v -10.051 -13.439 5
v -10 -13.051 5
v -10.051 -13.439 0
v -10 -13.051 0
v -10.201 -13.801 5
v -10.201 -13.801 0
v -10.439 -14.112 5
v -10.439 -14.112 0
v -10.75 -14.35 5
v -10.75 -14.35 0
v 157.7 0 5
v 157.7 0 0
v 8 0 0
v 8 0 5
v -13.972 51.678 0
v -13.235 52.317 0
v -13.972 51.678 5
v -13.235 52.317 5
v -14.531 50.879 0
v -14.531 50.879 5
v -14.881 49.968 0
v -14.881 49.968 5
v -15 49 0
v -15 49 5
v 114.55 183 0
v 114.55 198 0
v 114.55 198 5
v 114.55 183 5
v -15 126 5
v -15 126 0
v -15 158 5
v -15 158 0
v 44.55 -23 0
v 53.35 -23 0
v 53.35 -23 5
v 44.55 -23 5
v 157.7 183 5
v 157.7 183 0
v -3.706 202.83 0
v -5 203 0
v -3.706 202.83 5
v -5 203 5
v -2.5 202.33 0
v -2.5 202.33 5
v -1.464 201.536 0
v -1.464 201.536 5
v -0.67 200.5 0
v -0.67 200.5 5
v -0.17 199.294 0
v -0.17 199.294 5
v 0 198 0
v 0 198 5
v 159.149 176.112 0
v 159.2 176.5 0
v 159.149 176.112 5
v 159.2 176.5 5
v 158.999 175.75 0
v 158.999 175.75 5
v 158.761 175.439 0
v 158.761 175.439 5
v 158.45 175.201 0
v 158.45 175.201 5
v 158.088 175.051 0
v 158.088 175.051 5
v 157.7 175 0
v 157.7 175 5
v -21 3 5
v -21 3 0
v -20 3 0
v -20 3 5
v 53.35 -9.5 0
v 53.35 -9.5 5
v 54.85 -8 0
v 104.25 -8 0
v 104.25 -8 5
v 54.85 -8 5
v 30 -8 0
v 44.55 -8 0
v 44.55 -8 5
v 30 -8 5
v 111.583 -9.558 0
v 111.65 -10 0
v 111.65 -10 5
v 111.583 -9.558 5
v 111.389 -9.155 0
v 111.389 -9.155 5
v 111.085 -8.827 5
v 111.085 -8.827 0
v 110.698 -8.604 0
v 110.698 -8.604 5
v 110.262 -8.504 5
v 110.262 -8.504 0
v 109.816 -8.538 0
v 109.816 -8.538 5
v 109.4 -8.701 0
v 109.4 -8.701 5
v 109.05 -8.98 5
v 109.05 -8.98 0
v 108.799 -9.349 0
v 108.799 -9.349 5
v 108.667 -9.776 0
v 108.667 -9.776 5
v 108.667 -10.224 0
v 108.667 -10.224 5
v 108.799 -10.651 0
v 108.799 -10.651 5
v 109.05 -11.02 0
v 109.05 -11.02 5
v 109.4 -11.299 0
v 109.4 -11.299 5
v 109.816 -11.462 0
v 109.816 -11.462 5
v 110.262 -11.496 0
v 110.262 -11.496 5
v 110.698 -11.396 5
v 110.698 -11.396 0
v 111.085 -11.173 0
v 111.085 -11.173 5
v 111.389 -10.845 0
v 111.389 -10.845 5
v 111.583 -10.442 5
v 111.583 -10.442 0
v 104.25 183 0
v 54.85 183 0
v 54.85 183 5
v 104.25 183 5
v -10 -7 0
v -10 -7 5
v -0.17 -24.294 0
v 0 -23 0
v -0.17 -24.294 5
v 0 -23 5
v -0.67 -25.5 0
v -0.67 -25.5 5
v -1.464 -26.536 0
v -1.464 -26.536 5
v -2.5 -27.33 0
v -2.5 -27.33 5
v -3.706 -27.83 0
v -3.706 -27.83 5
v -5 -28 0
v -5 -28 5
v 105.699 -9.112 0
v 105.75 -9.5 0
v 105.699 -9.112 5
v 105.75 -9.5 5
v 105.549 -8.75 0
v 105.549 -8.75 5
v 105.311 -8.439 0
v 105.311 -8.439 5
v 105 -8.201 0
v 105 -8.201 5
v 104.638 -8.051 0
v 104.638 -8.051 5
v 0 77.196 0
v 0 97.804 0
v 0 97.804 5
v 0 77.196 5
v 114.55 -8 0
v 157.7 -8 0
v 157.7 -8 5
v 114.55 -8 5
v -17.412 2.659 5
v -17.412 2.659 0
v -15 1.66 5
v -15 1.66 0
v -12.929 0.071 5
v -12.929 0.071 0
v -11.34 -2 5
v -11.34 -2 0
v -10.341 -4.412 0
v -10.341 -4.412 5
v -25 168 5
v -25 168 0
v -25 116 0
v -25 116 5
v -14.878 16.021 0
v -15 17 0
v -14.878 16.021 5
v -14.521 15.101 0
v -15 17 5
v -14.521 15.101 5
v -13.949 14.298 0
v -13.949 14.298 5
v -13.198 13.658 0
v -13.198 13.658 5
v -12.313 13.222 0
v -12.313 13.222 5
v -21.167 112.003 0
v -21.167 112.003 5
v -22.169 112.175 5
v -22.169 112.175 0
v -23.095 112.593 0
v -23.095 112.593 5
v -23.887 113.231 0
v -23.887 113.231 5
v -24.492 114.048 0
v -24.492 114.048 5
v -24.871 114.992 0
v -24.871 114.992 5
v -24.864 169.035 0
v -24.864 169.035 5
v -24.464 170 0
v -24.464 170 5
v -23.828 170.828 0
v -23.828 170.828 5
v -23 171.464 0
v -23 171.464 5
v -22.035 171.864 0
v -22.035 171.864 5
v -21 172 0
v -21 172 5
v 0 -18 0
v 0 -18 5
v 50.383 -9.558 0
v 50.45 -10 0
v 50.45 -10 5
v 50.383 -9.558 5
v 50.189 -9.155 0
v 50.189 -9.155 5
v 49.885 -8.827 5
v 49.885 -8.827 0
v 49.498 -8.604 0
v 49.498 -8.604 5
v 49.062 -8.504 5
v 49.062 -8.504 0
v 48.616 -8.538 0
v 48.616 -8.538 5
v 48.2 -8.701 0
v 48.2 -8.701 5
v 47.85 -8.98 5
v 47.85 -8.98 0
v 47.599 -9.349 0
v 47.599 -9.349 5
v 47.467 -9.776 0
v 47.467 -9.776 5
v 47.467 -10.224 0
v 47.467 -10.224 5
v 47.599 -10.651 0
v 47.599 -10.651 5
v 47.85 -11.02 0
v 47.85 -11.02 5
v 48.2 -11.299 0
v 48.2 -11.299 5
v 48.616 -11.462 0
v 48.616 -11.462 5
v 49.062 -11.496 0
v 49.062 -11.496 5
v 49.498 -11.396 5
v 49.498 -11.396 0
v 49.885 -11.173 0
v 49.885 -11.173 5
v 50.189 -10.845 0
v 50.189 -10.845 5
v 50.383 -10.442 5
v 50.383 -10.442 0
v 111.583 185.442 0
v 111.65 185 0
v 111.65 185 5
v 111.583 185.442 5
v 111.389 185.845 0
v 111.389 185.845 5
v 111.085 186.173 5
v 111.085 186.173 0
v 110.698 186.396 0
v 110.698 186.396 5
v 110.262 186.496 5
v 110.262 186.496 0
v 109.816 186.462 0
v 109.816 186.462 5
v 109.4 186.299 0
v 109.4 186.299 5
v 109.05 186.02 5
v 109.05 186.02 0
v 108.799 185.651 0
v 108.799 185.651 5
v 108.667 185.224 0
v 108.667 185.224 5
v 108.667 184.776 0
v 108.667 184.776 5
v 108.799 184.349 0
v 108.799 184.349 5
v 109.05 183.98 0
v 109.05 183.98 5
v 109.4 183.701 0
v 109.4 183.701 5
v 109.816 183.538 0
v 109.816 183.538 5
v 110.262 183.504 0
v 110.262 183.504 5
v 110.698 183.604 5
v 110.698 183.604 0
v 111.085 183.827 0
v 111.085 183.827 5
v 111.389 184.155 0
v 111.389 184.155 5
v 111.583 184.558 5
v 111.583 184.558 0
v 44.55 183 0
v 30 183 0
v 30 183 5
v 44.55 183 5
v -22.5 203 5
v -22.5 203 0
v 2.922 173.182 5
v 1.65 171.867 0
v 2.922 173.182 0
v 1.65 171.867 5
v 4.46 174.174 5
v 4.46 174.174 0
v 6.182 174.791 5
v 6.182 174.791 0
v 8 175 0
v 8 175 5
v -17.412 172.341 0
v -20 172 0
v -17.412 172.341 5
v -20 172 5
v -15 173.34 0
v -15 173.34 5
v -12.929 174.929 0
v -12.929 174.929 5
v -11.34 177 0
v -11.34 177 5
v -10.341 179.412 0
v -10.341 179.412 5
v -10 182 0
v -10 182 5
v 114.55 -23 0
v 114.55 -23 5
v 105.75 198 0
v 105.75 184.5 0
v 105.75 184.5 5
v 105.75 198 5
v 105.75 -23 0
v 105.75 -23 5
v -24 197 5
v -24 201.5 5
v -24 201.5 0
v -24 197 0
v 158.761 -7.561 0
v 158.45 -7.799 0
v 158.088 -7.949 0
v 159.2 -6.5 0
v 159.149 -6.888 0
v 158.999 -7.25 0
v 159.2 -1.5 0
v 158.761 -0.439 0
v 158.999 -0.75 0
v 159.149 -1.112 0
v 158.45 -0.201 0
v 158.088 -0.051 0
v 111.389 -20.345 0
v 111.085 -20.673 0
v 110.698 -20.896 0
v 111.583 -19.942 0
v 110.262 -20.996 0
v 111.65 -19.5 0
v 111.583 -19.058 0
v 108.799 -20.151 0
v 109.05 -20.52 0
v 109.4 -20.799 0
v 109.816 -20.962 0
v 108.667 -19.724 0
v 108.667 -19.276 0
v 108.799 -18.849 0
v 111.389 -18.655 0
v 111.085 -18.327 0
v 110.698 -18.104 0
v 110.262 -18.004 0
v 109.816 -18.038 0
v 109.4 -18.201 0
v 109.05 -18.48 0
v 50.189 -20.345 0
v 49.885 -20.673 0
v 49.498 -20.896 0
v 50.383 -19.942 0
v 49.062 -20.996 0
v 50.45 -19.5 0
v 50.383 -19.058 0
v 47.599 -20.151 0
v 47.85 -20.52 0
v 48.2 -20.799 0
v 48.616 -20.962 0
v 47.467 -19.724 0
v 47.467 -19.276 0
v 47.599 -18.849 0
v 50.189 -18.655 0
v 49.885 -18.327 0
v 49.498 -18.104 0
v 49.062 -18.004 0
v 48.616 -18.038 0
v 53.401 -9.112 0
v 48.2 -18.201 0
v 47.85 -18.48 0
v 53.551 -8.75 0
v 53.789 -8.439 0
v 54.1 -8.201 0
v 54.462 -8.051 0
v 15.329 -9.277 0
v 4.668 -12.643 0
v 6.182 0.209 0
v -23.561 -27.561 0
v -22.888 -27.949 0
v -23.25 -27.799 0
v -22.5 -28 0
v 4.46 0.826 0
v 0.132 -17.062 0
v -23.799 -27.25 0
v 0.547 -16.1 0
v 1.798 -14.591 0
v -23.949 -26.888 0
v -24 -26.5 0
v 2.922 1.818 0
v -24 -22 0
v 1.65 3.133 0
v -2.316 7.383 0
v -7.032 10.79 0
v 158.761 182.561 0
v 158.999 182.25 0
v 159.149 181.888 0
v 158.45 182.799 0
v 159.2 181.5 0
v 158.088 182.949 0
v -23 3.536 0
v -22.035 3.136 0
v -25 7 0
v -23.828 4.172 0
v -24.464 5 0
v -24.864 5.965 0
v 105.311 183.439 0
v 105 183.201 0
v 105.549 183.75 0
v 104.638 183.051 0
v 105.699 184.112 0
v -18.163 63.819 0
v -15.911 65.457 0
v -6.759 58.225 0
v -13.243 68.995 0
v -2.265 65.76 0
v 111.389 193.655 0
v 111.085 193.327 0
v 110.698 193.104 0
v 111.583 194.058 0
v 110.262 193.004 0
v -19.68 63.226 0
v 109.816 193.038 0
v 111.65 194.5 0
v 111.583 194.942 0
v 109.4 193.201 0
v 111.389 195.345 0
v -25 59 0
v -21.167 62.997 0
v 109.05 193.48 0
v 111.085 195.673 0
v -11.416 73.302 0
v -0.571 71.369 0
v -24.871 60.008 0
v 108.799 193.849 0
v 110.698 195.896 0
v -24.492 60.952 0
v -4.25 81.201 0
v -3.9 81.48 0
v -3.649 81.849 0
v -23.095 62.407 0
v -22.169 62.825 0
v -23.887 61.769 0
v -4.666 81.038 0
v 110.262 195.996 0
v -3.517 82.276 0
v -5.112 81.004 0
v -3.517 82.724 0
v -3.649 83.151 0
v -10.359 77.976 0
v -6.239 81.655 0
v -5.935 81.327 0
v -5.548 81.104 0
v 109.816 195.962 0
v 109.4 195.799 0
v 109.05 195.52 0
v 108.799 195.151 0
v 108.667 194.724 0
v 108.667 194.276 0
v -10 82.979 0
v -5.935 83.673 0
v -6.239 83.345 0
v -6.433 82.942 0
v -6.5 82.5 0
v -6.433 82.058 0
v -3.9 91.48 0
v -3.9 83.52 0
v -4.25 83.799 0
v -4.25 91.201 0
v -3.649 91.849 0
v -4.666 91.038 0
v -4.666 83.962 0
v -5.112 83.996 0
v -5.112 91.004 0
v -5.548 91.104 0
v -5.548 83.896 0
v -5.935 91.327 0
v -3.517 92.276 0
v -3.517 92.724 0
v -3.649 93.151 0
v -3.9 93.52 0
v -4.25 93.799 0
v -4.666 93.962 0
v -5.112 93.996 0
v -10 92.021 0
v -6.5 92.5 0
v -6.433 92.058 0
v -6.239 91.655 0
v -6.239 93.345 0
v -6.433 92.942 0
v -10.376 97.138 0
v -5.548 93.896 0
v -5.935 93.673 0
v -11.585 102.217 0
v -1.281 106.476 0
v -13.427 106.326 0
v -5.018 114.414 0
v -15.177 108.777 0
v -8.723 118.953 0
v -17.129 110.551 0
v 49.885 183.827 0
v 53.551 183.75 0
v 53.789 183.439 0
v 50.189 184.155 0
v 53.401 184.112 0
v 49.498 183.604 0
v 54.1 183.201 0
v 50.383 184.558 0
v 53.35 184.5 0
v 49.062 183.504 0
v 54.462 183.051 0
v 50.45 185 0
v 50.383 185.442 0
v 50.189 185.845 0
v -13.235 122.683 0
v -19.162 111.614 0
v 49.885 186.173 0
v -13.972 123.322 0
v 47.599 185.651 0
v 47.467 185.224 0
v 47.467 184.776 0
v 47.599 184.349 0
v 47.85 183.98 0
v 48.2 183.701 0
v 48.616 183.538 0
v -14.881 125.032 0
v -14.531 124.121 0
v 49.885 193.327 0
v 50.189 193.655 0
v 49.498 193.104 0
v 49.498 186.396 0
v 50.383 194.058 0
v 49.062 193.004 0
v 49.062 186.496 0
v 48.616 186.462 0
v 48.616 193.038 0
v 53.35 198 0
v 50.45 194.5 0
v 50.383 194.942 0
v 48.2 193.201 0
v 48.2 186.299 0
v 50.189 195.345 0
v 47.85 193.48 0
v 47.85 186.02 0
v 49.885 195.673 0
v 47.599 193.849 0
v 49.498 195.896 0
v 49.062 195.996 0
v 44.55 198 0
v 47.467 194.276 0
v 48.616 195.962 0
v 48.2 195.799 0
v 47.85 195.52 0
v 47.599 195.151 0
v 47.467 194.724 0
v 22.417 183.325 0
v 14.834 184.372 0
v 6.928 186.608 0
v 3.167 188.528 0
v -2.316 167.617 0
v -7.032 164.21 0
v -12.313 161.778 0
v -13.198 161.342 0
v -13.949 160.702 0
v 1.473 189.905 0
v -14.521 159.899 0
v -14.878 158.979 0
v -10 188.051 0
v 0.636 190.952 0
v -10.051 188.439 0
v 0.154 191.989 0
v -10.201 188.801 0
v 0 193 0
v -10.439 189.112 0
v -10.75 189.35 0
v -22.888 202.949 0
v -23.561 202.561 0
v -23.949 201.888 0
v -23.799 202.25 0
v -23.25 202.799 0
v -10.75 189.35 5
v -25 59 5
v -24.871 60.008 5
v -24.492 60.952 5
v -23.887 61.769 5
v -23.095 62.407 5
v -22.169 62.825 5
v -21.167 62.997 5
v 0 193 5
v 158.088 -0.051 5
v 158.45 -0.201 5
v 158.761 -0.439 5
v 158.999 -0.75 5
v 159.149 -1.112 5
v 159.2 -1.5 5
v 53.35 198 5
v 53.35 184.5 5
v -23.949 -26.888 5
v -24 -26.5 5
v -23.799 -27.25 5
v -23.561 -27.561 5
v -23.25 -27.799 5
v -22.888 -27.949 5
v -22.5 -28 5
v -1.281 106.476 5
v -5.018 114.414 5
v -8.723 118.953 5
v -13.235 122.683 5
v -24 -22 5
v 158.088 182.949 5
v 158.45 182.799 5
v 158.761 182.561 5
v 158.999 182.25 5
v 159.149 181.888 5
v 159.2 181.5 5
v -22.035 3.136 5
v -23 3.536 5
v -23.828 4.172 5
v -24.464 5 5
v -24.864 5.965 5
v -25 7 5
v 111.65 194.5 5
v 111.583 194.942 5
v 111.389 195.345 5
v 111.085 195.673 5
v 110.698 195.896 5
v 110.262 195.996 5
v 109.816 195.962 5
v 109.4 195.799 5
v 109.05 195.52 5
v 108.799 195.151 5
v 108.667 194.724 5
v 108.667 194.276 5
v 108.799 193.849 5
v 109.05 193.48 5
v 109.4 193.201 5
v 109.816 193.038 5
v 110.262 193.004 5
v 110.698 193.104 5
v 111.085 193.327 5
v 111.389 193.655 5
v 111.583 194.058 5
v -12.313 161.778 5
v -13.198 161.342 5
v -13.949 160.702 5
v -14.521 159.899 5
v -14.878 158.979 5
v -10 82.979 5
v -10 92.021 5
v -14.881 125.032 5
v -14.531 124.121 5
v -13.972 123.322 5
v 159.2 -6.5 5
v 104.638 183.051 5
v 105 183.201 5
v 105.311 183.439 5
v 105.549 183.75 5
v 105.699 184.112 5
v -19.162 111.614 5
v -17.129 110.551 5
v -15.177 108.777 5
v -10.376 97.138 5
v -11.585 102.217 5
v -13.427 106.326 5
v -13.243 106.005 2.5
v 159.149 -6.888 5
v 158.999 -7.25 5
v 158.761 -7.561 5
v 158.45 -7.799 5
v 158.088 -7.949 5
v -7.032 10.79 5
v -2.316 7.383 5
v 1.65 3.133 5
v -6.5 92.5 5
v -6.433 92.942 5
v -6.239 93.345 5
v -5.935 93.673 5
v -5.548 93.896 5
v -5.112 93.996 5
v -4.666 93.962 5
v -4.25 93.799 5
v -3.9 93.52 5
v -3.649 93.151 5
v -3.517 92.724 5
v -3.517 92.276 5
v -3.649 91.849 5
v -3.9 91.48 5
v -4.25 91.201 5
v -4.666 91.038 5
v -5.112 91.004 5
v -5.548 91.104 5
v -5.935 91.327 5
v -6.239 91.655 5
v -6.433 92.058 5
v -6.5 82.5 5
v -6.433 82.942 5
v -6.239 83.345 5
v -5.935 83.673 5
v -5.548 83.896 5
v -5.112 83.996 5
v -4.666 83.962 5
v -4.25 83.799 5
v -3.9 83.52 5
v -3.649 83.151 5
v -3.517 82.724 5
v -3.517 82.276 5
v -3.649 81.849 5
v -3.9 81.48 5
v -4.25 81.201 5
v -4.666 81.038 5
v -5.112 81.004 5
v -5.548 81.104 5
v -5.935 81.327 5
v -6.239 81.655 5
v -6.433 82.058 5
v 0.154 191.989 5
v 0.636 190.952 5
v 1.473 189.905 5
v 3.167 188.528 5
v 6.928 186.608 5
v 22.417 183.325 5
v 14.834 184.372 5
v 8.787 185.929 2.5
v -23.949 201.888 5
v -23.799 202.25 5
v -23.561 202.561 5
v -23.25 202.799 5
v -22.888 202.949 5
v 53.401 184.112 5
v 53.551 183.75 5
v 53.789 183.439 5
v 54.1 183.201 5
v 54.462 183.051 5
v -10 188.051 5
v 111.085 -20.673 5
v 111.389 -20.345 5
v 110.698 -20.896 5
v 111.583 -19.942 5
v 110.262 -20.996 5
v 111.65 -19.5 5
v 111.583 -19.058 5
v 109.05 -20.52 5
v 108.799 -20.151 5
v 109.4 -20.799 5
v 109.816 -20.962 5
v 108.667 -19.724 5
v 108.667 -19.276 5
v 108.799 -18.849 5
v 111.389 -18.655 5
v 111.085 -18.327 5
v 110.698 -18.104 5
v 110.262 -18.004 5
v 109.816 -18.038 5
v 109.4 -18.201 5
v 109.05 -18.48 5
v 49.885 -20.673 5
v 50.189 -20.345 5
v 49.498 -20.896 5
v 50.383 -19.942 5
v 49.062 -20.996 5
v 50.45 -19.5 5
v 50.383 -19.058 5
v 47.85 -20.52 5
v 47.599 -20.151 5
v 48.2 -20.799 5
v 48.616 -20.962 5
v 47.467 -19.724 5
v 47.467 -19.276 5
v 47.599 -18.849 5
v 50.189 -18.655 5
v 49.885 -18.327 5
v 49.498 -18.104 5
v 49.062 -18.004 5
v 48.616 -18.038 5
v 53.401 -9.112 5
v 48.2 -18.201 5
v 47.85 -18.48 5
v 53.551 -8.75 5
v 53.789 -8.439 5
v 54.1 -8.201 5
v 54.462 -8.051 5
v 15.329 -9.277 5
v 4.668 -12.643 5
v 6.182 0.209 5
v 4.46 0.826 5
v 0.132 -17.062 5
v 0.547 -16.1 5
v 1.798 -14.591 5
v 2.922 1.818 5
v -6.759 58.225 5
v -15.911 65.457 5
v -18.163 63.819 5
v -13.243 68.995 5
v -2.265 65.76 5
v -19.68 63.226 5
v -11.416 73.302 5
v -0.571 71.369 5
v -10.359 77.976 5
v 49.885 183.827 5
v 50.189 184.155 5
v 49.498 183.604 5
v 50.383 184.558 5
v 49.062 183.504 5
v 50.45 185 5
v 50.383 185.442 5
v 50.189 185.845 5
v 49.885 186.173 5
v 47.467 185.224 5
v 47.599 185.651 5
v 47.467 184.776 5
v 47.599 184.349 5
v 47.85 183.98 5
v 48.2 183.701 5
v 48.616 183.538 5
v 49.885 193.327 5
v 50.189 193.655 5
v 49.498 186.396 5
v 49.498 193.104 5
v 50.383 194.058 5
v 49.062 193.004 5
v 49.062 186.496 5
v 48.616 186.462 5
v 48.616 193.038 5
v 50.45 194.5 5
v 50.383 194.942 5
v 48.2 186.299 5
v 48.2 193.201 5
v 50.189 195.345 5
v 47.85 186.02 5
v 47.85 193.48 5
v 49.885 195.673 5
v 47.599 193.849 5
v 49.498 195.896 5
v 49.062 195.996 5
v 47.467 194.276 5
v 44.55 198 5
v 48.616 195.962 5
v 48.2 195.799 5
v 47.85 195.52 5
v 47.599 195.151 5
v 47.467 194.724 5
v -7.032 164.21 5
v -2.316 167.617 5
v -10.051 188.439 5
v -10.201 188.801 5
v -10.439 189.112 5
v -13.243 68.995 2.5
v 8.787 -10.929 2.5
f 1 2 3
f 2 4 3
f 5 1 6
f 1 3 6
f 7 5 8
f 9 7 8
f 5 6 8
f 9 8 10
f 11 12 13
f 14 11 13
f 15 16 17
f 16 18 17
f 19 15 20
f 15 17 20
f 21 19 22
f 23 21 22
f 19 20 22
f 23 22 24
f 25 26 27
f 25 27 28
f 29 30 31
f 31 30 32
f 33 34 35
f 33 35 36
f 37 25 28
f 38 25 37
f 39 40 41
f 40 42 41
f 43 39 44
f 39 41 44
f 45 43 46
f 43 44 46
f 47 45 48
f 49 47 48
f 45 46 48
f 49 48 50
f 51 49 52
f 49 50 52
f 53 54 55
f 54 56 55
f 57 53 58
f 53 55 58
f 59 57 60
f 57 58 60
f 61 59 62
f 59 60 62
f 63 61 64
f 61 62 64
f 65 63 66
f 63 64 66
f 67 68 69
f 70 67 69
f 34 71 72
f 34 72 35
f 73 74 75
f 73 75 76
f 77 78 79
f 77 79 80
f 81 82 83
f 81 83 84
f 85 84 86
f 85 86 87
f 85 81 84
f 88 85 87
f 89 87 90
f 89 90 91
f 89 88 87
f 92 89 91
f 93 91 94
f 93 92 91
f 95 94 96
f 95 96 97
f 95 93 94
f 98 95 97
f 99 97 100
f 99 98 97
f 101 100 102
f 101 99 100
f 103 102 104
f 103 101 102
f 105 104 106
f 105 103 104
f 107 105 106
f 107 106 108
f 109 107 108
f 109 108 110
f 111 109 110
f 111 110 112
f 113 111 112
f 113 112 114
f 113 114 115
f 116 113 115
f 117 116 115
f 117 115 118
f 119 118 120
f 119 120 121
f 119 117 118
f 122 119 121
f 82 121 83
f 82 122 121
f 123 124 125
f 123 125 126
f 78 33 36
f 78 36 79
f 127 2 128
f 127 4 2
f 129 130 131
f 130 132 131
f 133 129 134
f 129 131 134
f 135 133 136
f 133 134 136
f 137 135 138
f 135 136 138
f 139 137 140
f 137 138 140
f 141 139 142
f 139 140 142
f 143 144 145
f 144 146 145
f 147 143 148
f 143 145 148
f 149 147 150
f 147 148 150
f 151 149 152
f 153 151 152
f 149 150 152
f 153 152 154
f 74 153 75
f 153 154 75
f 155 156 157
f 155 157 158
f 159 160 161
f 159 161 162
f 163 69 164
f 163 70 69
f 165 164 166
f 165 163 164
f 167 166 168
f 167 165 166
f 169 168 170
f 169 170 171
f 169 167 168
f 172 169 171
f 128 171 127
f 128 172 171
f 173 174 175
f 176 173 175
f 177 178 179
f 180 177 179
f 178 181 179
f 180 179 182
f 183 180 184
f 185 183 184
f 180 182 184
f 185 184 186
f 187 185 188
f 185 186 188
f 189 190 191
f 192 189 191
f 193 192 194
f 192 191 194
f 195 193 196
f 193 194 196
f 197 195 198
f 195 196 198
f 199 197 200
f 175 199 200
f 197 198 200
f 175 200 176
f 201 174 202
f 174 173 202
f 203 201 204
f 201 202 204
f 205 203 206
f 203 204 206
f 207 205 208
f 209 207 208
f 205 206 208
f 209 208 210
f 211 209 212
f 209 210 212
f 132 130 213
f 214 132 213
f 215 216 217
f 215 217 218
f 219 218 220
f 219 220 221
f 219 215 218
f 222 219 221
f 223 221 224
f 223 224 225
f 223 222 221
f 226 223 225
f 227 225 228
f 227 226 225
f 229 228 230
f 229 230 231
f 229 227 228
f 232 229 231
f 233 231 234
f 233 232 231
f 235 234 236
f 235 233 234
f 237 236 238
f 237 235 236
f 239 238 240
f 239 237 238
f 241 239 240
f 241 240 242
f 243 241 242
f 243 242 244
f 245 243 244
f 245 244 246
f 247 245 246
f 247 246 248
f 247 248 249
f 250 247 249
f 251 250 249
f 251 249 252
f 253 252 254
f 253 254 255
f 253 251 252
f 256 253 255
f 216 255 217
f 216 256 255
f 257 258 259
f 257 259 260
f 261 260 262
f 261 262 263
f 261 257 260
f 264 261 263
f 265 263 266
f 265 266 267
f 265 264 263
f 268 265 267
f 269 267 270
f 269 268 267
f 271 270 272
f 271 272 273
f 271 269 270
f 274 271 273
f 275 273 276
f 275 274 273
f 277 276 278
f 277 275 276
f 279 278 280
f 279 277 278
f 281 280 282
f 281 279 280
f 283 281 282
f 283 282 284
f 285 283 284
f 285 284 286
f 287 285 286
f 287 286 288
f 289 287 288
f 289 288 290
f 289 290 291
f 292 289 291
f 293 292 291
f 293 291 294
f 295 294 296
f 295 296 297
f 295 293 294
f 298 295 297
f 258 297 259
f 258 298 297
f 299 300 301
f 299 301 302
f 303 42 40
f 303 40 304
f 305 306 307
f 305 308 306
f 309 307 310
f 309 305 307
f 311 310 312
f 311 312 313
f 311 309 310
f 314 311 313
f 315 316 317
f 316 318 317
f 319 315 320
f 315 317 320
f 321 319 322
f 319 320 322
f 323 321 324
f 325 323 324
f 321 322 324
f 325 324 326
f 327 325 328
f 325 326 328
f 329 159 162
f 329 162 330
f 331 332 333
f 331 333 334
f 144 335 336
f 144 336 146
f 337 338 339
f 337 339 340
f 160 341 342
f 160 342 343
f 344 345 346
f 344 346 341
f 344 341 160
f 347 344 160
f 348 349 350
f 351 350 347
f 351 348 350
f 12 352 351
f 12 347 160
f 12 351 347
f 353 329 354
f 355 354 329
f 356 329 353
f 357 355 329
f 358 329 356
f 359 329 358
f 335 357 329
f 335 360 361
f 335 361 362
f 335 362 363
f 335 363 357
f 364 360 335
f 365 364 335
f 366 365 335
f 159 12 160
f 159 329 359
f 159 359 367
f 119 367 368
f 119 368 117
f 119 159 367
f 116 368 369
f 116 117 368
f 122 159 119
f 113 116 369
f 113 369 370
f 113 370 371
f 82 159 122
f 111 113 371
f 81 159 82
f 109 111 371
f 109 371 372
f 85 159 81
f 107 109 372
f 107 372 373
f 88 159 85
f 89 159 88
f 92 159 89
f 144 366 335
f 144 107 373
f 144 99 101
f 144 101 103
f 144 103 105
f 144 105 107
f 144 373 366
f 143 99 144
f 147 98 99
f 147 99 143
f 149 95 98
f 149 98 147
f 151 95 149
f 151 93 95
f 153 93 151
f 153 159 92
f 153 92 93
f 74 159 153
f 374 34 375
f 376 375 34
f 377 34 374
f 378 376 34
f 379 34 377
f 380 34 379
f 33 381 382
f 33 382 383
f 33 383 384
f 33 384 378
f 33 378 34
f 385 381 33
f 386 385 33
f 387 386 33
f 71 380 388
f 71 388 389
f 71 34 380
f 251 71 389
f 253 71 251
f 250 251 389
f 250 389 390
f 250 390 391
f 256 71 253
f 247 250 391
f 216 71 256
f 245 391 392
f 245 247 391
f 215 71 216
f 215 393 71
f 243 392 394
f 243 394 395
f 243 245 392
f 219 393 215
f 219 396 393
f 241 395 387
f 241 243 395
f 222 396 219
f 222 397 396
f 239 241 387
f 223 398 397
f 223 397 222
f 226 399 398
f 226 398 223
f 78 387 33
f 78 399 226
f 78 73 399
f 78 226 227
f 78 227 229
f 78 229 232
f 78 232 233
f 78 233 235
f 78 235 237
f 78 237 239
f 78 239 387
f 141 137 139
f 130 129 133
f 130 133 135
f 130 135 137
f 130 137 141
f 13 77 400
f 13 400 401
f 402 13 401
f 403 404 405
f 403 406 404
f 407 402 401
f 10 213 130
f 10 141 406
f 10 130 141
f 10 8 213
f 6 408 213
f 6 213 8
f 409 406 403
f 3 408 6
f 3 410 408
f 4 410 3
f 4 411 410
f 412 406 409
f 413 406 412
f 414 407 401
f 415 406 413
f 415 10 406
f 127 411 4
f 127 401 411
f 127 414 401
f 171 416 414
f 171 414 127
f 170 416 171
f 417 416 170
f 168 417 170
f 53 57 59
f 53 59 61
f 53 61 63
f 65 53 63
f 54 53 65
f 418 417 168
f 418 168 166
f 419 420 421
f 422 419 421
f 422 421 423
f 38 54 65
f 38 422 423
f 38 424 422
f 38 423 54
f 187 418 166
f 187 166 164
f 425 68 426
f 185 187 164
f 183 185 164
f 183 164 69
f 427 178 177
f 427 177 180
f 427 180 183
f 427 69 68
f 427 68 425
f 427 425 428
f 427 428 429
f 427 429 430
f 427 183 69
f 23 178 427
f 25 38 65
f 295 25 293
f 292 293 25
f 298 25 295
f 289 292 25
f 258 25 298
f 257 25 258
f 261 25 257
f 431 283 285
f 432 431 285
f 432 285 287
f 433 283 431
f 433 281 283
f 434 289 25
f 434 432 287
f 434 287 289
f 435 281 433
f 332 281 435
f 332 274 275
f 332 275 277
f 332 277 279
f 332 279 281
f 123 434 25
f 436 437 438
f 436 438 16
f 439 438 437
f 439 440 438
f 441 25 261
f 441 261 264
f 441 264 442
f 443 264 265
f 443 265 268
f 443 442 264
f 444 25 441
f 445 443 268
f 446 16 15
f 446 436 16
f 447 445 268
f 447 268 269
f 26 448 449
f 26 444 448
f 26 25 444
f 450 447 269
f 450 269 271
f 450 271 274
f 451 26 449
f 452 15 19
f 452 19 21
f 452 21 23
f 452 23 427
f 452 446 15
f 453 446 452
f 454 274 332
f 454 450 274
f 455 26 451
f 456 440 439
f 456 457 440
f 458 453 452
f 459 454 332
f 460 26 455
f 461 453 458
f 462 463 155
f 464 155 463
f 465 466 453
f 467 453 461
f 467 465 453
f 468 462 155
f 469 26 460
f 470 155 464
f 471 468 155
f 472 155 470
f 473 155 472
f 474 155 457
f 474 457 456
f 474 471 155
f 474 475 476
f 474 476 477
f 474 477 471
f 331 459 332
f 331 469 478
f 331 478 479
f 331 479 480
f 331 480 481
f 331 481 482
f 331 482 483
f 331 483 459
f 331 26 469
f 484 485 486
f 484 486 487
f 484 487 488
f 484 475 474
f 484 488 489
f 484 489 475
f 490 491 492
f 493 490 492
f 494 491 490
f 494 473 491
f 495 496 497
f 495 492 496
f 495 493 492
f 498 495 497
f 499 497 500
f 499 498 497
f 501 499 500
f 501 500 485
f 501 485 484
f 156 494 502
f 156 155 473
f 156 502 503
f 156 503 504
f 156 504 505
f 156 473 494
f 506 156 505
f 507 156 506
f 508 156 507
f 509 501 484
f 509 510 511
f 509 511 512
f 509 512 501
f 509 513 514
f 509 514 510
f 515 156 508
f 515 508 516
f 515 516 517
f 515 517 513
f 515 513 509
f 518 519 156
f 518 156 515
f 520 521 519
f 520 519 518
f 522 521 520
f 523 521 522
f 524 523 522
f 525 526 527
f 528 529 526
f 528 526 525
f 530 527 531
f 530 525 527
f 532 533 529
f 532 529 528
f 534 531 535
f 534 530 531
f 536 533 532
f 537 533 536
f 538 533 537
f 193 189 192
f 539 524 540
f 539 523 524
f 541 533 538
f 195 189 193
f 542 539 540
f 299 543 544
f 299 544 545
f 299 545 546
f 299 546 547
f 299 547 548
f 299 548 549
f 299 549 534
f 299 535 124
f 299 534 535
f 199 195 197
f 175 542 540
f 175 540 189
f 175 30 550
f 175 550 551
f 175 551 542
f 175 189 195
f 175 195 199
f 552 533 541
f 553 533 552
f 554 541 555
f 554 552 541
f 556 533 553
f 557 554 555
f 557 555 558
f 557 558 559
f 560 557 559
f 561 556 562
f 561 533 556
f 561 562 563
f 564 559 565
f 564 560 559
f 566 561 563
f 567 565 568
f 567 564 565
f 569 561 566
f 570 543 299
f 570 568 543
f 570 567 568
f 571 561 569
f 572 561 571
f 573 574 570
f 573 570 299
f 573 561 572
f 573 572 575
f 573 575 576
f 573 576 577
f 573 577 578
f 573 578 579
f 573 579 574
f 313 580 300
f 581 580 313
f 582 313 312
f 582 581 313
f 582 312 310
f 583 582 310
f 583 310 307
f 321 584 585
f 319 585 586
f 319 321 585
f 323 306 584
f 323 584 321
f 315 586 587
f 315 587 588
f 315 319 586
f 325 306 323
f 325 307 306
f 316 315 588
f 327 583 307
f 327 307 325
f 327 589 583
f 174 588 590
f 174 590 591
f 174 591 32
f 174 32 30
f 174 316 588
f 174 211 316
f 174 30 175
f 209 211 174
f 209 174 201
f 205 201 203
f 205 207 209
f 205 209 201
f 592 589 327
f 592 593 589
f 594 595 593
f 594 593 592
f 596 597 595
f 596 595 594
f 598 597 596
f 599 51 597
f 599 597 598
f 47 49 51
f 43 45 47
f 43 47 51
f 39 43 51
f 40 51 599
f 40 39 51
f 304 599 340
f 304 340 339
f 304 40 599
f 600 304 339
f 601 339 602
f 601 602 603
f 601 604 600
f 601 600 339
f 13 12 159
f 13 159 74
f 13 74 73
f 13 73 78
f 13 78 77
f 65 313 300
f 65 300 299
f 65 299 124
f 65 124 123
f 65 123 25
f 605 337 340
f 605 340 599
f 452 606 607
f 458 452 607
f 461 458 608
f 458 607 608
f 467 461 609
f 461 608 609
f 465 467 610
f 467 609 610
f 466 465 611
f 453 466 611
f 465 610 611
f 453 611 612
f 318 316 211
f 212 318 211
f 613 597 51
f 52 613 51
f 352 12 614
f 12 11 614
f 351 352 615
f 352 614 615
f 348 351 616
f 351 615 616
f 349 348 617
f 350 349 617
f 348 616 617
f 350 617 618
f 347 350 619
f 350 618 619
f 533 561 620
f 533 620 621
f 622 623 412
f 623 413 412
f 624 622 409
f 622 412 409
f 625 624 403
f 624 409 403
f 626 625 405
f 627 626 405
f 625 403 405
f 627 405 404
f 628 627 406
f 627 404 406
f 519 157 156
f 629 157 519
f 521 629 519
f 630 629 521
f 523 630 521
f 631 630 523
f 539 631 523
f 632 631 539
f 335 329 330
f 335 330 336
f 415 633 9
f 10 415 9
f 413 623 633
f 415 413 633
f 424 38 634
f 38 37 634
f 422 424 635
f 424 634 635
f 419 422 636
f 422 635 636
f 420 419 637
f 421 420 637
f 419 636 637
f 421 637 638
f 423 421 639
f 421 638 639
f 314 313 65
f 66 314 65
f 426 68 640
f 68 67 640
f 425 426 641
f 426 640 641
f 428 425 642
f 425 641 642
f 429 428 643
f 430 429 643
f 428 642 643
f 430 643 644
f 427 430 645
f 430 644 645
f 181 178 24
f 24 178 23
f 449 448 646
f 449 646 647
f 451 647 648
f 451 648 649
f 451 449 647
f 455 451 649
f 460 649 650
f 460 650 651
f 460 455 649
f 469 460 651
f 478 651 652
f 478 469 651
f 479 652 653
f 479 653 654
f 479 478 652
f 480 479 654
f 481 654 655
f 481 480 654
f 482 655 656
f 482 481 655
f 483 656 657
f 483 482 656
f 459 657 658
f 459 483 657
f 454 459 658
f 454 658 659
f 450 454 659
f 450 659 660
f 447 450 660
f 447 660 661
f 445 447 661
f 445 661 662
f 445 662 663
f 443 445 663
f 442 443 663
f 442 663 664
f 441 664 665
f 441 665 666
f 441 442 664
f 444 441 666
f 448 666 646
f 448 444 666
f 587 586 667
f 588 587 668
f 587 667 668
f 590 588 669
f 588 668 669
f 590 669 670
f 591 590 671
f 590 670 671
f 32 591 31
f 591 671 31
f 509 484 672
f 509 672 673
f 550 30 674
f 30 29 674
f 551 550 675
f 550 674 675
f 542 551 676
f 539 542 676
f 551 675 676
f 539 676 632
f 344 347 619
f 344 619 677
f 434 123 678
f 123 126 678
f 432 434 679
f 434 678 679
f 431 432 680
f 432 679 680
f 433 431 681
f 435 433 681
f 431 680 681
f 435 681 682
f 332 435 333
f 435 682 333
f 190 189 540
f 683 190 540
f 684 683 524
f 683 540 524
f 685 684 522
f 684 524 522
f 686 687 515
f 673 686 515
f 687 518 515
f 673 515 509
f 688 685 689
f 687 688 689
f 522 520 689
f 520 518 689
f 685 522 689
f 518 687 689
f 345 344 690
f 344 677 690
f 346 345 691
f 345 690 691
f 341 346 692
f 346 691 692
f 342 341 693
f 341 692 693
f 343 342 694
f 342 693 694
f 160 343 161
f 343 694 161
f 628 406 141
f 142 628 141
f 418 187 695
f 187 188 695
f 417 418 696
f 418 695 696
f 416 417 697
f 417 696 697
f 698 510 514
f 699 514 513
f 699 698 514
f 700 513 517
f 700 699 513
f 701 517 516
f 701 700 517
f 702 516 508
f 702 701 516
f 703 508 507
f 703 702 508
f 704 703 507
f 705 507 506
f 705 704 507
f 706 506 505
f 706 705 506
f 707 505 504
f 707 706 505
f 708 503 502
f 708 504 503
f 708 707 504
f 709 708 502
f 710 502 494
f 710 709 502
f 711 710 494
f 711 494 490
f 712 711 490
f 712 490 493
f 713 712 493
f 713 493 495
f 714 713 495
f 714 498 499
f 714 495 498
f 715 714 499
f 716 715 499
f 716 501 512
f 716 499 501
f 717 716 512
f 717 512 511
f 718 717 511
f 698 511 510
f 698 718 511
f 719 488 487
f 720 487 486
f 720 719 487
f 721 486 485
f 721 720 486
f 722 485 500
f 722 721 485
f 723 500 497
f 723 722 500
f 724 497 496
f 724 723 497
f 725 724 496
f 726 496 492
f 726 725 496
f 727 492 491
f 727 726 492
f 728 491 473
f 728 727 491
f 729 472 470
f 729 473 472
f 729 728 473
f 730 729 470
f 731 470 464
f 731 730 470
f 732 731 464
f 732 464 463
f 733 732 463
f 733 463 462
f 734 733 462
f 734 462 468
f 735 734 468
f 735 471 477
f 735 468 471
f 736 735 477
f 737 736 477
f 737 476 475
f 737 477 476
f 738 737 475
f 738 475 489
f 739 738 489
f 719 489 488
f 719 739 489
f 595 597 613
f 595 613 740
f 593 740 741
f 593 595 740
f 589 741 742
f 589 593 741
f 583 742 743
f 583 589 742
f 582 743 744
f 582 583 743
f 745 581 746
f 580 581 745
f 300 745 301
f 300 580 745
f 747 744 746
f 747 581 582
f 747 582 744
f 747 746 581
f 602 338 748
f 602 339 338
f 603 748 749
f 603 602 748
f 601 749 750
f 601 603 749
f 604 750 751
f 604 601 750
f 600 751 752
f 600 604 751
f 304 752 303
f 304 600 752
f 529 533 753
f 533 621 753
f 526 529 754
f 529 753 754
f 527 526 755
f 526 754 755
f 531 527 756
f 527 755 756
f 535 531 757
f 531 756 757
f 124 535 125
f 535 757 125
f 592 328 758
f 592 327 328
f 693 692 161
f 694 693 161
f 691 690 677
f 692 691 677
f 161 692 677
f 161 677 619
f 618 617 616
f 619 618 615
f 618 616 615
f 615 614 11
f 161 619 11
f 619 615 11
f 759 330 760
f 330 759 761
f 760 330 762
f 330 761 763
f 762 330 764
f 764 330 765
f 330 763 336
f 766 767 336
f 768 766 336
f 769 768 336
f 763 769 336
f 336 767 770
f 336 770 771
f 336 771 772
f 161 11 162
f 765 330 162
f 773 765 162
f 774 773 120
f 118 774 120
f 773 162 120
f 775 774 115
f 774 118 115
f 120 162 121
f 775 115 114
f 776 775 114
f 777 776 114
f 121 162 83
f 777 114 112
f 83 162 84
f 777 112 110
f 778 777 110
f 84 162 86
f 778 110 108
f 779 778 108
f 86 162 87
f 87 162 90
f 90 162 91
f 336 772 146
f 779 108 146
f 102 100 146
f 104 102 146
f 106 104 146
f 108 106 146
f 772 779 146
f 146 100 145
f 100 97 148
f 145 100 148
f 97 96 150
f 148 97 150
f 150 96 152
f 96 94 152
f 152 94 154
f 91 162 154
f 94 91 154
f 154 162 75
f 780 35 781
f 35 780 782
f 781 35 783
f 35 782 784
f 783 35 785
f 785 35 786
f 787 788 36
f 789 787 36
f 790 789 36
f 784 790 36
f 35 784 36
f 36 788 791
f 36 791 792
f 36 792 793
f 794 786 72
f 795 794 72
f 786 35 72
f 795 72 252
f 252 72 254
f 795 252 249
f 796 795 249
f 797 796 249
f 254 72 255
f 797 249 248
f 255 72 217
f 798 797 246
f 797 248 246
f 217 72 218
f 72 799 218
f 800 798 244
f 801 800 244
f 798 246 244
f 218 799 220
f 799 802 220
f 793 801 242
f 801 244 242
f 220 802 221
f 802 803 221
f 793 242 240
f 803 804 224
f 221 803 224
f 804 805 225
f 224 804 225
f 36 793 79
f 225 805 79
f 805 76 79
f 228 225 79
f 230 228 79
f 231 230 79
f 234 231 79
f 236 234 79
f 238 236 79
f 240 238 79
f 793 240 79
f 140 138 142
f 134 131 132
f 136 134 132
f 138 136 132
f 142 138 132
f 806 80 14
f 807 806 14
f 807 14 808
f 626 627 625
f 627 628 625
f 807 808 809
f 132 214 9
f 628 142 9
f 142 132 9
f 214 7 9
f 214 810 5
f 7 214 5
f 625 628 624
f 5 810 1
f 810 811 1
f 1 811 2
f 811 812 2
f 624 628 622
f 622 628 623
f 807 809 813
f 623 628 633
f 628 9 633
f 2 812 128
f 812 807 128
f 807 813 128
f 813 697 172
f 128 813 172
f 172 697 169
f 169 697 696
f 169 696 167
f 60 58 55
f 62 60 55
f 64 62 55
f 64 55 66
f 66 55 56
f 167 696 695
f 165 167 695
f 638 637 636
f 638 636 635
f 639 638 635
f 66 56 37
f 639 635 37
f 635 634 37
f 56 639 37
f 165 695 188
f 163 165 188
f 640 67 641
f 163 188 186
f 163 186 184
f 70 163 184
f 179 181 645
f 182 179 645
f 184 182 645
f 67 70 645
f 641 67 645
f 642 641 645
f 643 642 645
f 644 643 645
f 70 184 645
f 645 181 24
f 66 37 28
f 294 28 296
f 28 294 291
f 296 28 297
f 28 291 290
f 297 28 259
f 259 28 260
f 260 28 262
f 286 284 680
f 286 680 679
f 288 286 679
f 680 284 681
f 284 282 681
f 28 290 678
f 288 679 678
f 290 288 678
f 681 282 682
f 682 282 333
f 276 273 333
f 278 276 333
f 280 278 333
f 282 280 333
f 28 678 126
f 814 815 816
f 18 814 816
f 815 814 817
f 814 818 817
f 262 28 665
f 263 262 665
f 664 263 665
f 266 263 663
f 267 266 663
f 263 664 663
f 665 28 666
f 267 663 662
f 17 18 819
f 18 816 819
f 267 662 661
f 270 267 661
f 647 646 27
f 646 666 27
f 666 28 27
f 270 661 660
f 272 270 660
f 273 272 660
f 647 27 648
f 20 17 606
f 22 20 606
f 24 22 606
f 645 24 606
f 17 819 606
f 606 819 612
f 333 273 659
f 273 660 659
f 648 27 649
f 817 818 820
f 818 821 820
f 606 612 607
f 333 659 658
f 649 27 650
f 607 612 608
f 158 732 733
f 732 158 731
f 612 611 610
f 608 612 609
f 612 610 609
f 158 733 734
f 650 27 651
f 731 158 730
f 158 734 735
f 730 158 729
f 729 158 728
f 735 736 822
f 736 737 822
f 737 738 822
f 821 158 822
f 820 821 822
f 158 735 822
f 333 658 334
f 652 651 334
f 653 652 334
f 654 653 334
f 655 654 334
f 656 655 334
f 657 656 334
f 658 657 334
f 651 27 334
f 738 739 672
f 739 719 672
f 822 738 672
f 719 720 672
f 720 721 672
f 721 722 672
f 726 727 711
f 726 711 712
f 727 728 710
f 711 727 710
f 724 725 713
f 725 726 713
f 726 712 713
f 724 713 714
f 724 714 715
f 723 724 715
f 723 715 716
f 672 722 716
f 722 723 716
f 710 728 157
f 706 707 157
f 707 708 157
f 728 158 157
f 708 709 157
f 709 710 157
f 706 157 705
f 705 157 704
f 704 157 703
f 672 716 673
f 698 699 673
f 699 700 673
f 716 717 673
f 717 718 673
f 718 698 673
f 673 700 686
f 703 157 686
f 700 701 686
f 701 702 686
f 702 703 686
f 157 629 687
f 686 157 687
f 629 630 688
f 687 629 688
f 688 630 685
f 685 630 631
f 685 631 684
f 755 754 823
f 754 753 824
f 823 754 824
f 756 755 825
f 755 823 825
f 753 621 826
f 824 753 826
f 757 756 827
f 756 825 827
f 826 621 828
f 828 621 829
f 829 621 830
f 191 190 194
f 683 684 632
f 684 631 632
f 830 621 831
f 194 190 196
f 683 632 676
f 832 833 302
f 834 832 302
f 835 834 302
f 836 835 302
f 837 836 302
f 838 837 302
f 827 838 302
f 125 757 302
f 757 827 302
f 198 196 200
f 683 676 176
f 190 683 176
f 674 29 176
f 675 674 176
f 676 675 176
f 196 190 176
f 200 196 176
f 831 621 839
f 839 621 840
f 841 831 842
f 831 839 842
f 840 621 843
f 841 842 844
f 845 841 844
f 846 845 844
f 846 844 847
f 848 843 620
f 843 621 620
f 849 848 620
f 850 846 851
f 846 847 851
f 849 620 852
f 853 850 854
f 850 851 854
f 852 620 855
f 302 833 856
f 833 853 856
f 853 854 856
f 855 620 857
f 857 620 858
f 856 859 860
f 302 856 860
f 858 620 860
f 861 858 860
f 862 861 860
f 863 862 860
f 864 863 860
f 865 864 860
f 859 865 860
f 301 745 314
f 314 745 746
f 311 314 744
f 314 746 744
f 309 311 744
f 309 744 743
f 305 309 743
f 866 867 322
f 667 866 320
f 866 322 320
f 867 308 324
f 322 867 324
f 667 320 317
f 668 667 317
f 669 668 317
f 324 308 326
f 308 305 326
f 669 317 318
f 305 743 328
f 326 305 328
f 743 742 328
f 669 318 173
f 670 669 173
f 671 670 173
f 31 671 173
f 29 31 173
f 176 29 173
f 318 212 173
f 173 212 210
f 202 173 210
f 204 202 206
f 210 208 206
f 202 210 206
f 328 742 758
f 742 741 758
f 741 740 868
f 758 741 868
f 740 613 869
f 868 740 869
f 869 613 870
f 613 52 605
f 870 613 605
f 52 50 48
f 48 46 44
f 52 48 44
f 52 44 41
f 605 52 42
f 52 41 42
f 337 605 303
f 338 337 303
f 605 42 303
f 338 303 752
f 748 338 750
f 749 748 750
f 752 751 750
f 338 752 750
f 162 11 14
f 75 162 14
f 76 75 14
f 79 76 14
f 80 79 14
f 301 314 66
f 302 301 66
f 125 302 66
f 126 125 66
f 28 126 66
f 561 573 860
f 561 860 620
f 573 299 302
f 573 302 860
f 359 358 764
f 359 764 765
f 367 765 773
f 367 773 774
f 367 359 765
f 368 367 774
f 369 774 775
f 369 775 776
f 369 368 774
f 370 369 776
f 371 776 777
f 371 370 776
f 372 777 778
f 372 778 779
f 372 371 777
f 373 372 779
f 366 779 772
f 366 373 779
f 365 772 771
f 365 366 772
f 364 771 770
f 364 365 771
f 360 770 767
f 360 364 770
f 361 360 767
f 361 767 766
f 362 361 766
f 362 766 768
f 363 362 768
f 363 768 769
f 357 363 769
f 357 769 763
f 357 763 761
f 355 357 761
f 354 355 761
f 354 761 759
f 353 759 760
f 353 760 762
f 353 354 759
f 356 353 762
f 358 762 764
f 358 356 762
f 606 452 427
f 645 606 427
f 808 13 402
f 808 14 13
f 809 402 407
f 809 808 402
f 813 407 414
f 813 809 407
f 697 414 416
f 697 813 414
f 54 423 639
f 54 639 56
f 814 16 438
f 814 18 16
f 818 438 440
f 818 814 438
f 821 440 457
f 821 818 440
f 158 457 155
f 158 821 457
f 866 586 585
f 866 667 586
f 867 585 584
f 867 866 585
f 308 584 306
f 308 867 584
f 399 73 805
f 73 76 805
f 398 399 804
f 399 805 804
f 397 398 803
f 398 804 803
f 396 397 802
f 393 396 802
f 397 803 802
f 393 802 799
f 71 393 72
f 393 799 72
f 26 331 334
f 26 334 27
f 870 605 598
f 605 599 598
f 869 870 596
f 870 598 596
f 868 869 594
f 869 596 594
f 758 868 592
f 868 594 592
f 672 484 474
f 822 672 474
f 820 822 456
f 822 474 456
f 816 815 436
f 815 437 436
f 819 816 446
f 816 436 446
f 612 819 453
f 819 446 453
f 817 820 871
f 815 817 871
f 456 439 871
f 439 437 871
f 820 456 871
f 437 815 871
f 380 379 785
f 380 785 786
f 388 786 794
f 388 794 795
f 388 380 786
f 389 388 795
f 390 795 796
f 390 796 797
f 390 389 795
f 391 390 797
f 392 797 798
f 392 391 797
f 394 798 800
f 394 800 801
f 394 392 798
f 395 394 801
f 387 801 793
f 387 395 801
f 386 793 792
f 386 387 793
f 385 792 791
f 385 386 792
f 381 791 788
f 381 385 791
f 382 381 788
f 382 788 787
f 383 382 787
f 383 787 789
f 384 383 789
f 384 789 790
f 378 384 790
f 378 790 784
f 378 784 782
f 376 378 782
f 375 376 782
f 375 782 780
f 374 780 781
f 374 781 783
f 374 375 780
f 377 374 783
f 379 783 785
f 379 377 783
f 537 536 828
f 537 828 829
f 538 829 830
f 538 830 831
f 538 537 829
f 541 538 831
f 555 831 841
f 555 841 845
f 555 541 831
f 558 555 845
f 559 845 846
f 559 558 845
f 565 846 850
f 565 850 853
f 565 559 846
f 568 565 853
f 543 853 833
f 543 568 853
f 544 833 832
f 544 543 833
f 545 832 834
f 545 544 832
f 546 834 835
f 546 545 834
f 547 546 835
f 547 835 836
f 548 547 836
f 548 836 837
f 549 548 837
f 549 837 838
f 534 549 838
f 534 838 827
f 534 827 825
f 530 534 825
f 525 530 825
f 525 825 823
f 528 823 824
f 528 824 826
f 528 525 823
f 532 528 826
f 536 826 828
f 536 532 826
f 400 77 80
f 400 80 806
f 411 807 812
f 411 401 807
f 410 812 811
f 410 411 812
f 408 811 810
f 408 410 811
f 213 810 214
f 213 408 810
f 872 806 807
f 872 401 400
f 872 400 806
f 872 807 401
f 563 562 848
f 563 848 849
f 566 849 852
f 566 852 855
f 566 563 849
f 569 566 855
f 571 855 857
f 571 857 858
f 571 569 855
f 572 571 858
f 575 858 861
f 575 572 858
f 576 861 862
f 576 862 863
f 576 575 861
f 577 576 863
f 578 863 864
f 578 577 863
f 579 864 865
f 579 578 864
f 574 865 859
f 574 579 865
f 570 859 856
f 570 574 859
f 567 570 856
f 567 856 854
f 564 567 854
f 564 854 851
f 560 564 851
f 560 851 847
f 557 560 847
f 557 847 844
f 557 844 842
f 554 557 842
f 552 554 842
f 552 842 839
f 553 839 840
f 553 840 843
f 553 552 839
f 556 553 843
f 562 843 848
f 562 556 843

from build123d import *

# Parameters (mm, degrees)
SKETCH_1_R          = 1.5
SKETCH_1_W          = 10
SKETCH_1_H          = 20
EXTRUDE_1_DEPTH     = 5
FILLET_1_R          = 1.5
FILLET_2_R          = 8
EXTRUDE_5_DEPTH     = 5
SKETCH_7_R          = 1.5
CUT_EXTRUDE_1_DEPTH = 259.028370533
FILLET_5_R          = 1.5
EXTRUDE_6_DEPTH     = 5
SKETCH_9_W          = 10
SKETCH_9_H          = 40
CUT_EXTRUDE_2_DEPTH = 259.028370533
FILLET_6_R          = 4
FILLET_8_R          = 10
FILLET_9_R          = 10
FILLET_10_DEPTH     = 5
FILLET_11_DEPTH     = 5
FILLET_13_SIZE      = 10
FILLET_13_SIZE_2    = 30
FILLET_14_SIZE      = 30
FILLET_14_SIZE_2    = 10
FILLET_15_R         = 5
FILLET_16_R         = 30
FILLET_17_R         = 30
FILLET_18_R         = 30


with BuildPart() as part:
    # 草图1 → 凸台-拉伸1 (new body)
    # profile 1 of 3: a face of its own
    with BuildSketch(Plane.XY):
        Polygon((105.75, 0), (114.65, 0), (159.2, 0), (159.2, -8), (114.55, -8), (114.55, -23), (105.75, -23), (105.75, -8), (53.35, -8), (53.35, -23), (44.55, -23), (44.55, -8), (-10, -8), (-10, 183), (44.55, 183), (44.55, 198), (53.35, 198), (53.35, 183), (105.75, 183), (105.75, 198), (114.55, 198), (114.55, 183), (159.2, 183), (159.2, 175), (114.65, 175), (105.75, 175), (53.35, 175), (44.55, 175), (0, 175), (0, 0), (44.55, 0), (53.35, 0), align=None)
        with Locations((48.95, -10)):
            Circle(SKETCH_1_R, mode=Mode.SUBTRACT)
        with Locations((110.15, -19.5)):
            Circle(SKETCH_1_R, mode=Mode.SUBTRACT)
        with Locations((110.15, -10)):
            Circle(SKETCH_1_R, mode=Mode.SUBTRACT)
        with Locations((110.15, 194.5)):
            Circle(SKETCH_1_R, mode=Mode.SUBTRACT)
        with Locations((48.95, 194.5)):
            Circle(SKETCH_1_R, mode=Mode.SUBTRACT)
        with Locations((48.95, 185)):
            Circle(SKETCH_1_R, mode=Mode.SUBTRACT)
        with Locations((110.15, 185)):
            Circle(SKETCH_1_R, mode=Mode.SUBTRACT)
        with Locations((48.95, -19.5)):
            Circle(SKETCH_1_R, mode=Mode.SUBTRACT)
    # profile 2 of 3: a face of its own
    with BuildSketch(Plane.XY):
        with Locations((-5, 193)):
            Rectangle(SKETCH_1_W, SKETCH_1_H)
    # profile 3 of 3: a face of its own
    with BuildSketch(Plane.XY):
        with Locations((-5, -18)):
            Rectangle(SKETCH_1_W, SKETCH_1_H)
    extrude(amount=EXTRUDE_1_DEPTH)

    # 圆角1
    fillet_1_edges = [part.edges().sort_by_distance(p)[0] for p in [
        (159.2, 0, 2.5),
        (159.2, -8, 2.5),
        (105.75, -8, 2.5),
        (53.35, -8, 2.5),
        (53.35, 183, 2.5),
        (105.75, 183, 2.5),
        (159.2, 183, 2.5),
        (159.2, 175, 2.5),
    ]]
    fillet(fillet_1_edges, radius=FILLET_1_R)

    # 圆角2
    fillet_2_edges = [part.edges().sort_by_distance(p)[0] for p in [
        (0, 175, 2.5),
        (0, 0, 2.5),
    ]]
    fillet(fillet_2_edges, radius=FILLET_2_R)

    # 草图6 → 凸台-拉伸5 (add)
    with BuildSketch(Plane.XY.offset(5)):
        Polygon((-24, 197), (-10, 188.917096231), (-10, 203), (-24, 203), align=None)
        Polygon((-10, -28), (-24, -28), (-24, -22), (-10, -13.917096231), align=None)
    extrude(amount=-EXTRUDE_5_DEPTH)

    # 草图7 → 切除-拉伸1 (cut, through all)
    with BuildSketch(Plane(origin=(0, 0, 5), x_dir=(-1, 0, 0), z_dir=(0, 0, -1))):
        with Locations((5, 92.5)):
            Circle(SKETCH_7_R)
        with Locations((5, 82.5)):
            Circle(SKETCH_7_R)
    extrude(amount=CUT_EXTRUDE_1_DEPTH, mode=Mode.SUBTRACT)

    # 圆角5
    fillet_5_edges = [part.edges().sort_by_distance(p)[0] for p in [
        (-24, 203, 2.5),
        (-10, 188.917096231, 2.5),
        (-10, -13.917096231, 2.5),
        (-24, -28, 2.5),
    ]]
    fillet(fillet_5_edges, radius=FILLET_5_R)

    # 草图8 → 凸台-拉伸6 (add, through all)
    with BuildSketch(Plane(origin=(0, 0, 0), x_dir=(-1, 0, 0), z_dir=(0, 0, -1))):
        Polygon((25, 112), (10, 112), (10, 122), (15, 122), (15, 162), (10, 162), (10, 172), (25, 172), align=None)
        Polygon((15, 53), (10, 53), (10, 63), (25, 63), (25, 3), (10, 3), (10, 13), (15, 13), align=None)
    extrude(amount=-EXTRUDE_6_DEPTH)

    # 草图9 → 切除-拉伸2 (cut, through all)
    with BuildSketch(Plane(origin=(0, 0, 0), x_dir=(-1, 0, 0), z_dir=(0, 0, -1))):
        with Locations((5, 142)):
            Rectangle(SKETCH_9_W, SKETCH_9_H)
        with Locations((5, 33)):
            Rectangle(SKETCH_9_W, SKETCH_9_H)
    extrude(amount=-CUT_EXTRUDE_2_DEPTH, mode=Mode.SUBTRACT)

    # 圆角6
    fillet_6_edges = [part.edges().sort_by_distance(p)[0] for p in [
        (-25, 172, 2.5),
        (-25, 112, 2.5),
        (-15, 122, 2.5),
        (-15, 162, 2.5),
        (-25, 63, 2.5),
        (-25, 3, 2.5),
        (-15, 13, 2.5),
        (-15, 53, 2.5),
    ]]
    fillet(fillet_6_edges, radius=FILLET_6_R)

    # 圆角8
    fillet_8_edges = [part.edges().sort_by_distance(p)[0] for p in [
        (-10, 172, 2.5),
    ]]
    fillet(fillet_8_edges, radius=FILLET_8_R)

    # 圆角9
    fillet_9_edges = [part.edges().sort_by_distance(p)[0] for p in [
        (-10, 3, 2.5),
    ]]
    fillet(fillet_9_edges, radius=FILLET_9_R)

    # 圆角10: read off the stored shape, not the designer's step
    # 圆角10 outline → 圆角10 (add)
    with BuildSketch(Plane.XY):
        with BuildLine():
            Line((-10, 63), (-10, 82.979157617))
            add(Edge.make_bspline(
                [(-10, 82.979157617), (-10, 63.462208461), (-21.166666667, 62.996526269)],
                knots=[0, 0, 0, 1, 1, 1], degree=2, weights=[1, 0.721687836, 1]))
            ThreePointArc((-21.166666667, 62.996526269), (-21.083351432, 62.999131473), (-21, 63))
            Line((-21, 63), (-10, 63))
        make_face()
    extrude(amount=FILLET_10_DEPTH)

    # 圆角11: read off the stored shape, not the designer's step
    # 圆角11 outline → 圆角11 (add)
    with BuildSketch(Plane.XY):
        with BuildLine():
            ThreePointArc((-21, 112), (-21.083351432, 112.000868527), (-21.166666667, 112.003473731))
            add(Edge.make_bspline(
                [(-21.166666667, 112.003473731), (-10, 111.537791539), (-10, 92.020842383)],
                knots=[0, 0, 0, 1, 1, 1], degree=2, weights=[1, 0.721687836, 1]))
            Line((-10, 92.020842383), (-10, 112))
            Line((-10, 112), (-21, 112))
        make_face()
    extrude(amount=FILLET_11_DEPTH)

    # 圆角13
    # a fillet whose section is not a circle: 30, 10 mm, written as the material it adds along each edge
    with BuildSketch(Plane(origin=(0, 183, 0), x_dir=(0, 1, 0), z_dir=(0, 0, 1))) as fillet_13_piece_1:
        with BuildLine():
            Bezier((FILLET_13_SIZE, 0), (0, 0), (0, -FILLET_13_SIZE_2), weights=[1, 0.707106781, 1])
            Line((0, -FILLET_13_SIZE_2), (0, 0))
            Line((0, 0), (FILLET_13_SIZE, 0))
        make_face()
    extrude(amount=5)

    # 圆角14
    # a fillet whose section is not a circle: 30, 10 mm, written as the material it adds along each edge
    with BuildSketch(Plane(origin=(0, -8, 0), x_dir=(1, 0, 0), z_dir=(0, 0, 1))) as fillet_14_piece_1:
        with BuildLine():
            Bezier((FILLET_14_SIZE, 0), (0, 0), (0, -FILLET_14_SIZE_2), weights=[1, 0.707106781, 1])
            Line((0, -FILLET_14_SIZE_2), (0, 0))
            Line((0, 0), (FILLET_14_SIZE, 0))
        make_face()
    extrude(amount=5)

    # 圆角15
    fillet_15_edges = [part.edges().sort_by_distance(p)[0] for p in [
        (0, -28, 2.5),
        (0, 203, 2.5),
    ]]
    fillet(fillet_15_edges, radius=FILLET_15_R)

    # 圆角16
    fillet_16_edges = [part.edges().sort_by_distance(p)[0] for p in [
        (0, 162, 2.5),
    ]]
    fillet(fillet_16_edges, radius=FILLET_16_R)

    # 圆角17
    fillet_17_edges = [part.edges().sort_by_distance(p)[0] for p in [
        (0, 13, 2.5),
    ]]
    fillet(fillet_17_edges, radius=FILLET_17_R)

    # 圆角18
    fillet_18_edges = [part.edges().sort_by_distance(p)[0] for p in [
        (0, 53, 2.5),
        (0, 122, 2.5),
    ]]
    fillet(fillet_18_edges, radius=FILLET_18_R)


solid = part.part
